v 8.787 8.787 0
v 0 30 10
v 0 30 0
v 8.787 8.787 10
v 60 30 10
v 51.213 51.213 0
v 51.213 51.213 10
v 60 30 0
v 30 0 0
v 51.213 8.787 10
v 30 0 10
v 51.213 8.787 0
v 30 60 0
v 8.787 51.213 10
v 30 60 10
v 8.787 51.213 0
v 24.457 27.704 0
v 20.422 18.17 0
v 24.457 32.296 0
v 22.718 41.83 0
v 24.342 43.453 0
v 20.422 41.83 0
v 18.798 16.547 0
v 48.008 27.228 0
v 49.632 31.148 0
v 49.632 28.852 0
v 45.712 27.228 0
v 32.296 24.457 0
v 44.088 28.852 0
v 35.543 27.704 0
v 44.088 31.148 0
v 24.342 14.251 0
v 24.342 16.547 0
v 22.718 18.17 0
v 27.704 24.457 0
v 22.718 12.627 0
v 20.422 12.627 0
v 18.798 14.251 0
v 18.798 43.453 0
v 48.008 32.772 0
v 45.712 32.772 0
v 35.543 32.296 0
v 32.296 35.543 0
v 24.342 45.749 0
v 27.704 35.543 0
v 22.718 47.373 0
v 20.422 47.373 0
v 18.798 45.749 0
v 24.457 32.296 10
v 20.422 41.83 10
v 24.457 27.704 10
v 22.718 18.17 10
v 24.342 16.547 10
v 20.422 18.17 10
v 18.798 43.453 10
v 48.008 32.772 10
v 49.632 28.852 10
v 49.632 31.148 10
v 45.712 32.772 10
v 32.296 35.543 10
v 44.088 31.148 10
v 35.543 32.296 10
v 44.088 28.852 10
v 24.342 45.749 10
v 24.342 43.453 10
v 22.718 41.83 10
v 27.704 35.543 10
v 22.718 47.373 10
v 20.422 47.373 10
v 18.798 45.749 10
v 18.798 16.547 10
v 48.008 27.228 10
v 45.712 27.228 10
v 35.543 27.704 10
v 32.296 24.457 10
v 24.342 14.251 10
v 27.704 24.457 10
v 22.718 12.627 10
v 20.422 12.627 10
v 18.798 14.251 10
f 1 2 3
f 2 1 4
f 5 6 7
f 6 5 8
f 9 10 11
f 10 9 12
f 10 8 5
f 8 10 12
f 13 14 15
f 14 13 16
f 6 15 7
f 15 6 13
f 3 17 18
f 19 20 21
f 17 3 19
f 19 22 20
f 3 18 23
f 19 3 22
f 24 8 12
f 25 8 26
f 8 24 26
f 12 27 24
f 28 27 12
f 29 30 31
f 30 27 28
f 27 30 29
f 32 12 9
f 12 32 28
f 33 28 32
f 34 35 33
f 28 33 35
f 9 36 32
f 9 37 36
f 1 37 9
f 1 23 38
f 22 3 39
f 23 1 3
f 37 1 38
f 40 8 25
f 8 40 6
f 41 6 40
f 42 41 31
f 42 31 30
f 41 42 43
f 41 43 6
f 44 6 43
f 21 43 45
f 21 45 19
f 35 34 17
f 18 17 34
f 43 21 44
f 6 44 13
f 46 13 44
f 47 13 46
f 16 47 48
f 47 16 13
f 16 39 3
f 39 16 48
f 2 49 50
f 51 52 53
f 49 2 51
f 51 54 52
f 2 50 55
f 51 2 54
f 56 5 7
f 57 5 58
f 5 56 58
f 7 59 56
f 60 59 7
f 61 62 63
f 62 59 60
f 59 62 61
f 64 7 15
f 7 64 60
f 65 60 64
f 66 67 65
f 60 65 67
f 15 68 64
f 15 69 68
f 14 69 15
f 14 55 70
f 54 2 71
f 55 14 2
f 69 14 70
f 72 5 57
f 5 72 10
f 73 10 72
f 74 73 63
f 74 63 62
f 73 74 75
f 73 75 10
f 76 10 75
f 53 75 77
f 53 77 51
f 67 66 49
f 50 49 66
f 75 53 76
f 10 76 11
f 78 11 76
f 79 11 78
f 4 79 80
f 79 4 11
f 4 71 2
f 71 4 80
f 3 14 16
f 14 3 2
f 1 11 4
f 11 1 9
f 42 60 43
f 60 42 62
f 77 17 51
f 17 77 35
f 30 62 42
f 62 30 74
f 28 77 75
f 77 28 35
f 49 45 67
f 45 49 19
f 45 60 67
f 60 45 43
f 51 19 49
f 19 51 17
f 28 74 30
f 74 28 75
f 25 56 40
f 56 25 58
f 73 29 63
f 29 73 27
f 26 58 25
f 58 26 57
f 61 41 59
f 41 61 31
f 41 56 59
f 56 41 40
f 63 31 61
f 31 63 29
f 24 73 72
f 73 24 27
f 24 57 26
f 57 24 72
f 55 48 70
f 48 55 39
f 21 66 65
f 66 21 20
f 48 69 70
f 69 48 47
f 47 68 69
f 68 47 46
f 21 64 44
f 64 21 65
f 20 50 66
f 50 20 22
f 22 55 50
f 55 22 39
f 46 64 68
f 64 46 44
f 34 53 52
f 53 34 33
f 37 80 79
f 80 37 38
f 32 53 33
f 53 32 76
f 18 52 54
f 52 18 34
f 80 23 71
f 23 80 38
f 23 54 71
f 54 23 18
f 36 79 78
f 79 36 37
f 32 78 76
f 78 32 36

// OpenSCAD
$fn = 32;

// ----------------------------------------------------------------------
// Polygon plate: 8-gon R30, 3 bolt windows
// ----------------------------------------------------------------------

// --- parameters (mm) ---
sides = 8;                // number of polygon sides
plate_r = 30;             // circumscribed radius of the polygon
bore_r = 6;               // centre bore radius
bolts = 3;                // number of bolt windows
ring_r = 16.86;           // bolt-circle radius
bolt_r = 3;               // bolt window radius
plate_t = 10;             // plate thickness, Z (extrusion height)

plate_d = 2 * plate_r;  // circumscribed diameter
bore_d = 2 * bore_r;  // centre bore diameter
bolt_d = 2 * bolt_r;  // bolt window diameter
ring_d = 2 * ring_r;  // bolt-circle diameter

profile = [[60, 30], [51.213, 51.213], [30, 60], [8.787, 51.213], [0, 30], [8.787, 8.787], [30, 0], [51.213, 8.787]];  // primary outline, 8 points, counter clockwise
void_1 = [[35.543, 32.296], [32.296, 35.543], [27.704, 35.543], [24.457, 32.296], [24.457, 27.704], [27.704, 24.457], [32.296, 24.457], [35.543, 27.704]];  // centre bore, 8 points
void_2 = [[49.632, 31.148], [48.008, 32.772], [45.712, 32.772], [44.088, 31.148], [44.088, 28.852], [45.712, 27.228], [48.008, 27.228], [49.632, 28.852]];  // bolt window 1, 8 points
void_3 = [[24.342, 45.749], [22.718, 47.373], [20.422, 47.373], [18.798, 45.749], [18.798, 43.453], [20.422, 41.83], [22.718, 41.83], [24.342, 43.453]];  // bolt window 2, 8 points
void_4 = [[24.342, 16.547], [22.718, 18.17], [20.422, 18.17], [18.798, 16.547], [18.798, 14.251], [20.422, 12.627], [22.718, 12.627], [24.342, 14.251]];  // bolt window 3, 8 points

// --- the one profile operation ---
difference() {
  linear_extrude(height = plate_t) polygon(points = profile);
  translate([0, 0, -1])
    linear_extrude(height = plate_t + 2) polygon(points = void_1);
  translate([0, 0, -1])
    linear_extrude(height = plate_t + 2) polygon(points = void_2);
  translate([0, 0, -1])
    linear_extrude(height = plate_t + 2) polygon(points = void_3);
  translate([0, 0, -1])
    linear_extrude(height = plate_t + 2) polygon(points = void_4);
}
